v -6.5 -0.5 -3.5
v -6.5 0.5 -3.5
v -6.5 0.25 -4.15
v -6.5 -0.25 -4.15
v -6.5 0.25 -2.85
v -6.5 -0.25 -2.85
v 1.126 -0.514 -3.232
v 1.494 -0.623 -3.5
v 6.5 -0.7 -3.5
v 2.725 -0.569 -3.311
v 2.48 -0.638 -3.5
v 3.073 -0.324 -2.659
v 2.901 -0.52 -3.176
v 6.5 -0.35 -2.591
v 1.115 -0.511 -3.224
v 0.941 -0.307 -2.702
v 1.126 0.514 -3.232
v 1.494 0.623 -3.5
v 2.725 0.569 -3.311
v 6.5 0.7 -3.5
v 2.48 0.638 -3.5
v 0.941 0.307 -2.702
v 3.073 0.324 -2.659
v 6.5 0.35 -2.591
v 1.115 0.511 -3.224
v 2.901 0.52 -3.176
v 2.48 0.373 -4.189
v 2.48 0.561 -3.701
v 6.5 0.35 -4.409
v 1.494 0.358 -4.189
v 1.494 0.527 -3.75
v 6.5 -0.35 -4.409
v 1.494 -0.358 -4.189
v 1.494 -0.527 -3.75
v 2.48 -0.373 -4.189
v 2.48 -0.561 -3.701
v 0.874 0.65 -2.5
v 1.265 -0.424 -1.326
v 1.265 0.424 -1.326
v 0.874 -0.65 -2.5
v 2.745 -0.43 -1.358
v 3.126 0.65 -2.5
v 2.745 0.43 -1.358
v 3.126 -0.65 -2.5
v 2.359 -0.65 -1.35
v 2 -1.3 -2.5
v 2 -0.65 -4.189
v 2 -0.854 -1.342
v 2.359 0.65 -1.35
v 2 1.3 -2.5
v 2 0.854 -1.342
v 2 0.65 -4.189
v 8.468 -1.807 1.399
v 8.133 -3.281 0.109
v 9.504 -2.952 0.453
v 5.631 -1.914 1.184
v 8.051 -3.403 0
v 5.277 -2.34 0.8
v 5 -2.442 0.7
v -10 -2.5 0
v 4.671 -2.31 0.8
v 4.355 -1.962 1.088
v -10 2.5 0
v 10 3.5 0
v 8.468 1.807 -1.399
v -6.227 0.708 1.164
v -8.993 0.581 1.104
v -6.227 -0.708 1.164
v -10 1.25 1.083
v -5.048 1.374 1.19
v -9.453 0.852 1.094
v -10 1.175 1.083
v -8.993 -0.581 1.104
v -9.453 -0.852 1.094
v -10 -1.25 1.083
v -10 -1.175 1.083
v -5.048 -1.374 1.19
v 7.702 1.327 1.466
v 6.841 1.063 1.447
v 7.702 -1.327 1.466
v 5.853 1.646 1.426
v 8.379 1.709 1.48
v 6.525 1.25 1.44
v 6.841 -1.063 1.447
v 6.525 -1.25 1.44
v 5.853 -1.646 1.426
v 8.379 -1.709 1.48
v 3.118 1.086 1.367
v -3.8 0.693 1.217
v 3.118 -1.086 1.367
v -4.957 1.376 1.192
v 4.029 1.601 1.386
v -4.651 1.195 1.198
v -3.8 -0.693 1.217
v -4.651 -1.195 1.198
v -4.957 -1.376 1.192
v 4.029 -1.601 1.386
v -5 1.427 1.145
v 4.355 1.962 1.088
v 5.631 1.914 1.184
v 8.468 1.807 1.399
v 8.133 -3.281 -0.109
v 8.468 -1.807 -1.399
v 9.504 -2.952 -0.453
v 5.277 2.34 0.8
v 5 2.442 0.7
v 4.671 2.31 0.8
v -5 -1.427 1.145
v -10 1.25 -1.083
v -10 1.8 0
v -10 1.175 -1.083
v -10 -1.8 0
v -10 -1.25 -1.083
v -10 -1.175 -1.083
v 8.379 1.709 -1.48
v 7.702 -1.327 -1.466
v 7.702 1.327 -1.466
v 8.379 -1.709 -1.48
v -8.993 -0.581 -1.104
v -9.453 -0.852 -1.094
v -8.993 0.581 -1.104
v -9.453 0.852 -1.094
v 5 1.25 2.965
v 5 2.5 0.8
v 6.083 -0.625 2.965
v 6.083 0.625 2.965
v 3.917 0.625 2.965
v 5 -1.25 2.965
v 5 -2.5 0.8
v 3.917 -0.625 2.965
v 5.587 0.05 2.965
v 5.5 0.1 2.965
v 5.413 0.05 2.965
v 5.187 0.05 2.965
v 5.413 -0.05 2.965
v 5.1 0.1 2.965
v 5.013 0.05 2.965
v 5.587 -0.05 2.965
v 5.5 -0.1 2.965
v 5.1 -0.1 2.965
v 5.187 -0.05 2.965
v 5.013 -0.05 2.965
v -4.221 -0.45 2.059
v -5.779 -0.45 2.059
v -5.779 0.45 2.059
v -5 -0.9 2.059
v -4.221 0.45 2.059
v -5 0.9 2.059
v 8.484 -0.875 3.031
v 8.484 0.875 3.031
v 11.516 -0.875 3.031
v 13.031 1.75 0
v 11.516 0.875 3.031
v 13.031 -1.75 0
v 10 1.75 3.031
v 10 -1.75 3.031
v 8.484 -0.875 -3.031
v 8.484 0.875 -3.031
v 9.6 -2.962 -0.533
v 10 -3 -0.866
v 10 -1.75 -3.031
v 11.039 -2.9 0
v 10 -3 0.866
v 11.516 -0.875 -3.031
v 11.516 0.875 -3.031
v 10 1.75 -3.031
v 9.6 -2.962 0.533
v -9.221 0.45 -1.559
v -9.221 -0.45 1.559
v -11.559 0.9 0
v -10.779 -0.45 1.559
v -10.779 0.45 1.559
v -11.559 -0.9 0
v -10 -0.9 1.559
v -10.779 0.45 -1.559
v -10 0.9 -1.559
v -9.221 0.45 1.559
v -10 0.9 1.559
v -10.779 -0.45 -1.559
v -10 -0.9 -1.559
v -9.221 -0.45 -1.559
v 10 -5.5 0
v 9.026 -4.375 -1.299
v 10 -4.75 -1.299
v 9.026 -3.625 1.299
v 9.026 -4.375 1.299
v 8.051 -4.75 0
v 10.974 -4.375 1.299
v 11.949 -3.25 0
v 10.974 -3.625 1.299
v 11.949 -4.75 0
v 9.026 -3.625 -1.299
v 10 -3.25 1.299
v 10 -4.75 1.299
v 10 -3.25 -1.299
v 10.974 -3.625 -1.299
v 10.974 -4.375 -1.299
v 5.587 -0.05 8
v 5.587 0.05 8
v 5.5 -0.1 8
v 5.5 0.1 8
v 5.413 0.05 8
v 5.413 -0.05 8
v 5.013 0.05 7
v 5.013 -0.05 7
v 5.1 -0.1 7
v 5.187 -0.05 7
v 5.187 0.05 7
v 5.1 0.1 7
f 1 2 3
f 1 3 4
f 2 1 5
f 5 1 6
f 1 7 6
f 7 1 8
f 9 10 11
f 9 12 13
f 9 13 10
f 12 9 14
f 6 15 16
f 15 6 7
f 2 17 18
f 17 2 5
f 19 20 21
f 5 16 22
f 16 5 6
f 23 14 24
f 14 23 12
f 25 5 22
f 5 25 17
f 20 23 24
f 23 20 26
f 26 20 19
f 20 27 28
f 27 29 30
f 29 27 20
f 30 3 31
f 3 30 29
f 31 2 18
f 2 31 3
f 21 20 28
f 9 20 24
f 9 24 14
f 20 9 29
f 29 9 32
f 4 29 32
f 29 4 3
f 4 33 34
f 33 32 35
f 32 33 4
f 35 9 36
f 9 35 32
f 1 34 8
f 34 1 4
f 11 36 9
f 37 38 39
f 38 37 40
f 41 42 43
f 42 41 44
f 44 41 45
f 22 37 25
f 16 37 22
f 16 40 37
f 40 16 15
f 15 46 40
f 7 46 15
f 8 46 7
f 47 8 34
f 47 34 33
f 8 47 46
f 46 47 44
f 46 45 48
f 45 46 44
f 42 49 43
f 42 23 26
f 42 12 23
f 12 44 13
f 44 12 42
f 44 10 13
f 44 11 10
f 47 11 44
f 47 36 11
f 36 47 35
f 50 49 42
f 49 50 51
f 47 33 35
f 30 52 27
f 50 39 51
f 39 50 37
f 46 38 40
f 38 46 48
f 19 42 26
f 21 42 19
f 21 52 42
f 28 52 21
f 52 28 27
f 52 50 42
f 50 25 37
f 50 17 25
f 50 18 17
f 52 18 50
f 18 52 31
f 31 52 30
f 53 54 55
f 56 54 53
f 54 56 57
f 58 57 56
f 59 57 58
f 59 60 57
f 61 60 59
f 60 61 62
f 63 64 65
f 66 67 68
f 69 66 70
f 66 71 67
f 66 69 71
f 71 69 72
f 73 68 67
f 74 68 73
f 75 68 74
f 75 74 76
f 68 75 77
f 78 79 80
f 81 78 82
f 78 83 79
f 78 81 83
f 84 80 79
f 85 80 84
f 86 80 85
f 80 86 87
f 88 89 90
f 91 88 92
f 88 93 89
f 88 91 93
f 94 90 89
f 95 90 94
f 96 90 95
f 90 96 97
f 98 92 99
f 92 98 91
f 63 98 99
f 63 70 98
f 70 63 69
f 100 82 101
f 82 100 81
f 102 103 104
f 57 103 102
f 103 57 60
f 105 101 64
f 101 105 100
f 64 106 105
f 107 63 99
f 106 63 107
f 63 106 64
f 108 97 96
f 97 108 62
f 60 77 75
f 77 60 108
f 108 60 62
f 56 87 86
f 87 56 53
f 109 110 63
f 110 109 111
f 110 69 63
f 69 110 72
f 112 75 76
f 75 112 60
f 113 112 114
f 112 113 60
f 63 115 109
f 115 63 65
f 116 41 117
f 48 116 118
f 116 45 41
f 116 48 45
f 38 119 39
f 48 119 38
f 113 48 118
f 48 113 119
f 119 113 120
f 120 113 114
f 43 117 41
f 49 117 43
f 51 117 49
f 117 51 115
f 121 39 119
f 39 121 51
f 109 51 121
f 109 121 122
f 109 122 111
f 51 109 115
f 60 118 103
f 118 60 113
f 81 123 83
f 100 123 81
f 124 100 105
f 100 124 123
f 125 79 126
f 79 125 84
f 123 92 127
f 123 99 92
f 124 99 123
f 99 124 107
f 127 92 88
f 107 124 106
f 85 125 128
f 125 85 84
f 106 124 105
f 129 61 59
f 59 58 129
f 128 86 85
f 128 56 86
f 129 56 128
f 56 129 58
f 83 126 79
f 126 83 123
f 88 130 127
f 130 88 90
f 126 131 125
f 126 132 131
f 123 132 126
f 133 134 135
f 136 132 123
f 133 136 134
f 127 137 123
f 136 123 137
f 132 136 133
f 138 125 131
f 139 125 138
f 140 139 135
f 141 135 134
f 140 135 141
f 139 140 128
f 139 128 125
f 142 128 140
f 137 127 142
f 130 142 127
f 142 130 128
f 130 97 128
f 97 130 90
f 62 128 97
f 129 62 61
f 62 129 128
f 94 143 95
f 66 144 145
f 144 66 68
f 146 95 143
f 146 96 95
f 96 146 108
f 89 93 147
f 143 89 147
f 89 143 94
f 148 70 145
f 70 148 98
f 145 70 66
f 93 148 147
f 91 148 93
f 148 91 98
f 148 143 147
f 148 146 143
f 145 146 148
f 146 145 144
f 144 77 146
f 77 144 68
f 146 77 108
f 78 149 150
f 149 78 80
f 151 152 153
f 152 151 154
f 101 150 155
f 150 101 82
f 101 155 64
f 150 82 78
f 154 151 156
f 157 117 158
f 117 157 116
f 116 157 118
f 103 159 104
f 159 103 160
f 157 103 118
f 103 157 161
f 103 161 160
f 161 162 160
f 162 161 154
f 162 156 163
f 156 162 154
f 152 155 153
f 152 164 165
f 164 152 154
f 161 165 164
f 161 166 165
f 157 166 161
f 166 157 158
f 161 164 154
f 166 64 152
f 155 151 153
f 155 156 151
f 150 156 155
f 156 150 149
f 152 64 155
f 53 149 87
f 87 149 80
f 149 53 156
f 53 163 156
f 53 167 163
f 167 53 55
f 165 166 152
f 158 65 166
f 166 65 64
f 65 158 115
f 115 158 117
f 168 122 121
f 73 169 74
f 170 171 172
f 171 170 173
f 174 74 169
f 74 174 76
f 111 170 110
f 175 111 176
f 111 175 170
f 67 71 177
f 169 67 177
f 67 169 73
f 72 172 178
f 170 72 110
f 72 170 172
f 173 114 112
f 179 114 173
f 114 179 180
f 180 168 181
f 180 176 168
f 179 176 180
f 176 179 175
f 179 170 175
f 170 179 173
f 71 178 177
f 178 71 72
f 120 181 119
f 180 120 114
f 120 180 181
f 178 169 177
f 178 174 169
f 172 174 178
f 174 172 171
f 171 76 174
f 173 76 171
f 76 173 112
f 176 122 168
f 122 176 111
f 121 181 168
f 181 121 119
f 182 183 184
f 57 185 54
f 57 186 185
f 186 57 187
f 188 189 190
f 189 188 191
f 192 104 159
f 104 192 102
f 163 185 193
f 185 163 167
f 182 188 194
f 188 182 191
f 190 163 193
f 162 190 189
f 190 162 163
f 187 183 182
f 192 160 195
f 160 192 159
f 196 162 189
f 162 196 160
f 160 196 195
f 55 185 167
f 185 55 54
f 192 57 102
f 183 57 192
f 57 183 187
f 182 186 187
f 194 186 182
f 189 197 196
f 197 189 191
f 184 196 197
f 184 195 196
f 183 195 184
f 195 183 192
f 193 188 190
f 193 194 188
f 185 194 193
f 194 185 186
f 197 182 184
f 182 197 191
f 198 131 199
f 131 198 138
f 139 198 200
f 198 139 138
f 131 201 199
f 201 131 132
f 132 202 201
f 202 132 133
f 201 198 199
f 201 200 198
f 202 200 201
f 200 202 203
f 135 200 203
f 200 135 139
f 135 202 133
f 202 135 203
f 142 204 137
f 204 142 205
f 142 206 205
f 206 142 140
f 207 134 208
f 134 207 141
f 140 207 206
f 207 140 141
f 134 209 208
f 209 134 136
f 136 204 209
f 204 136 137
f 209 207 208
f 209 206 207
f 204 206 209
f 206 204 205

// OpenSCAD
module little_pod()
{
	scale(v = [1, 1.5, 1])
		sphere(r = 1.5, center = true);
}

module main_fuselage()
{
	union() {
		union() {
			rotate(a = 90, v = [1, 0, 0]) {
				scale(v = [1, 0.5, 1])
					cylinder(h = 20, r1 = 3.5, r2 = 2.5, center = true);
			}
			translate(v = [0, 5, 0.8])
				sphere(r = 2.5, center = true);
			translate(v = [0, -5, 0.5])
				sphere(r = 1.8, center = true);
		}
		translate(v = [0, 10, 0])
			sphere(r = 3.5, center = true);
		translate(v = [0, -10, 0])
			sphere(r = 1.8, center = true);
		translate(v = [4, 10, 0])
			little_pod();
		translate(v = [0, 5.5, 4])
			cylinder(h = 8, r1 = 0.1, r2 = 0.1, center = true);
		translate(v = [0, 5.1, 4])
			cylinder(h = 6, r1 = 0.1, r2 = 0.1, center = true);
	}
}

module sub_fuselage()
{
	union() {
		rotate(a = 90, v = [1, 0, 0]) {
			scale(v = [1, 1.5, 1])
				cylinder(h = 13, r1 = 0.7, r2 = 0.5, center = true);
		}
		translate(v = [0, 2, 1])
			scale(v = [1, 1, 1.5])
				sphere(r = 1.3, center = true);
	}
}

module ship()
{
	rotate(a = -90, v = [0, 0, 1])
	union() {
		translate(v = [0, 0, -3.5])
			sub_fuselage();
		main_fuselage();
	}
}

$fn = 6;
ship();
